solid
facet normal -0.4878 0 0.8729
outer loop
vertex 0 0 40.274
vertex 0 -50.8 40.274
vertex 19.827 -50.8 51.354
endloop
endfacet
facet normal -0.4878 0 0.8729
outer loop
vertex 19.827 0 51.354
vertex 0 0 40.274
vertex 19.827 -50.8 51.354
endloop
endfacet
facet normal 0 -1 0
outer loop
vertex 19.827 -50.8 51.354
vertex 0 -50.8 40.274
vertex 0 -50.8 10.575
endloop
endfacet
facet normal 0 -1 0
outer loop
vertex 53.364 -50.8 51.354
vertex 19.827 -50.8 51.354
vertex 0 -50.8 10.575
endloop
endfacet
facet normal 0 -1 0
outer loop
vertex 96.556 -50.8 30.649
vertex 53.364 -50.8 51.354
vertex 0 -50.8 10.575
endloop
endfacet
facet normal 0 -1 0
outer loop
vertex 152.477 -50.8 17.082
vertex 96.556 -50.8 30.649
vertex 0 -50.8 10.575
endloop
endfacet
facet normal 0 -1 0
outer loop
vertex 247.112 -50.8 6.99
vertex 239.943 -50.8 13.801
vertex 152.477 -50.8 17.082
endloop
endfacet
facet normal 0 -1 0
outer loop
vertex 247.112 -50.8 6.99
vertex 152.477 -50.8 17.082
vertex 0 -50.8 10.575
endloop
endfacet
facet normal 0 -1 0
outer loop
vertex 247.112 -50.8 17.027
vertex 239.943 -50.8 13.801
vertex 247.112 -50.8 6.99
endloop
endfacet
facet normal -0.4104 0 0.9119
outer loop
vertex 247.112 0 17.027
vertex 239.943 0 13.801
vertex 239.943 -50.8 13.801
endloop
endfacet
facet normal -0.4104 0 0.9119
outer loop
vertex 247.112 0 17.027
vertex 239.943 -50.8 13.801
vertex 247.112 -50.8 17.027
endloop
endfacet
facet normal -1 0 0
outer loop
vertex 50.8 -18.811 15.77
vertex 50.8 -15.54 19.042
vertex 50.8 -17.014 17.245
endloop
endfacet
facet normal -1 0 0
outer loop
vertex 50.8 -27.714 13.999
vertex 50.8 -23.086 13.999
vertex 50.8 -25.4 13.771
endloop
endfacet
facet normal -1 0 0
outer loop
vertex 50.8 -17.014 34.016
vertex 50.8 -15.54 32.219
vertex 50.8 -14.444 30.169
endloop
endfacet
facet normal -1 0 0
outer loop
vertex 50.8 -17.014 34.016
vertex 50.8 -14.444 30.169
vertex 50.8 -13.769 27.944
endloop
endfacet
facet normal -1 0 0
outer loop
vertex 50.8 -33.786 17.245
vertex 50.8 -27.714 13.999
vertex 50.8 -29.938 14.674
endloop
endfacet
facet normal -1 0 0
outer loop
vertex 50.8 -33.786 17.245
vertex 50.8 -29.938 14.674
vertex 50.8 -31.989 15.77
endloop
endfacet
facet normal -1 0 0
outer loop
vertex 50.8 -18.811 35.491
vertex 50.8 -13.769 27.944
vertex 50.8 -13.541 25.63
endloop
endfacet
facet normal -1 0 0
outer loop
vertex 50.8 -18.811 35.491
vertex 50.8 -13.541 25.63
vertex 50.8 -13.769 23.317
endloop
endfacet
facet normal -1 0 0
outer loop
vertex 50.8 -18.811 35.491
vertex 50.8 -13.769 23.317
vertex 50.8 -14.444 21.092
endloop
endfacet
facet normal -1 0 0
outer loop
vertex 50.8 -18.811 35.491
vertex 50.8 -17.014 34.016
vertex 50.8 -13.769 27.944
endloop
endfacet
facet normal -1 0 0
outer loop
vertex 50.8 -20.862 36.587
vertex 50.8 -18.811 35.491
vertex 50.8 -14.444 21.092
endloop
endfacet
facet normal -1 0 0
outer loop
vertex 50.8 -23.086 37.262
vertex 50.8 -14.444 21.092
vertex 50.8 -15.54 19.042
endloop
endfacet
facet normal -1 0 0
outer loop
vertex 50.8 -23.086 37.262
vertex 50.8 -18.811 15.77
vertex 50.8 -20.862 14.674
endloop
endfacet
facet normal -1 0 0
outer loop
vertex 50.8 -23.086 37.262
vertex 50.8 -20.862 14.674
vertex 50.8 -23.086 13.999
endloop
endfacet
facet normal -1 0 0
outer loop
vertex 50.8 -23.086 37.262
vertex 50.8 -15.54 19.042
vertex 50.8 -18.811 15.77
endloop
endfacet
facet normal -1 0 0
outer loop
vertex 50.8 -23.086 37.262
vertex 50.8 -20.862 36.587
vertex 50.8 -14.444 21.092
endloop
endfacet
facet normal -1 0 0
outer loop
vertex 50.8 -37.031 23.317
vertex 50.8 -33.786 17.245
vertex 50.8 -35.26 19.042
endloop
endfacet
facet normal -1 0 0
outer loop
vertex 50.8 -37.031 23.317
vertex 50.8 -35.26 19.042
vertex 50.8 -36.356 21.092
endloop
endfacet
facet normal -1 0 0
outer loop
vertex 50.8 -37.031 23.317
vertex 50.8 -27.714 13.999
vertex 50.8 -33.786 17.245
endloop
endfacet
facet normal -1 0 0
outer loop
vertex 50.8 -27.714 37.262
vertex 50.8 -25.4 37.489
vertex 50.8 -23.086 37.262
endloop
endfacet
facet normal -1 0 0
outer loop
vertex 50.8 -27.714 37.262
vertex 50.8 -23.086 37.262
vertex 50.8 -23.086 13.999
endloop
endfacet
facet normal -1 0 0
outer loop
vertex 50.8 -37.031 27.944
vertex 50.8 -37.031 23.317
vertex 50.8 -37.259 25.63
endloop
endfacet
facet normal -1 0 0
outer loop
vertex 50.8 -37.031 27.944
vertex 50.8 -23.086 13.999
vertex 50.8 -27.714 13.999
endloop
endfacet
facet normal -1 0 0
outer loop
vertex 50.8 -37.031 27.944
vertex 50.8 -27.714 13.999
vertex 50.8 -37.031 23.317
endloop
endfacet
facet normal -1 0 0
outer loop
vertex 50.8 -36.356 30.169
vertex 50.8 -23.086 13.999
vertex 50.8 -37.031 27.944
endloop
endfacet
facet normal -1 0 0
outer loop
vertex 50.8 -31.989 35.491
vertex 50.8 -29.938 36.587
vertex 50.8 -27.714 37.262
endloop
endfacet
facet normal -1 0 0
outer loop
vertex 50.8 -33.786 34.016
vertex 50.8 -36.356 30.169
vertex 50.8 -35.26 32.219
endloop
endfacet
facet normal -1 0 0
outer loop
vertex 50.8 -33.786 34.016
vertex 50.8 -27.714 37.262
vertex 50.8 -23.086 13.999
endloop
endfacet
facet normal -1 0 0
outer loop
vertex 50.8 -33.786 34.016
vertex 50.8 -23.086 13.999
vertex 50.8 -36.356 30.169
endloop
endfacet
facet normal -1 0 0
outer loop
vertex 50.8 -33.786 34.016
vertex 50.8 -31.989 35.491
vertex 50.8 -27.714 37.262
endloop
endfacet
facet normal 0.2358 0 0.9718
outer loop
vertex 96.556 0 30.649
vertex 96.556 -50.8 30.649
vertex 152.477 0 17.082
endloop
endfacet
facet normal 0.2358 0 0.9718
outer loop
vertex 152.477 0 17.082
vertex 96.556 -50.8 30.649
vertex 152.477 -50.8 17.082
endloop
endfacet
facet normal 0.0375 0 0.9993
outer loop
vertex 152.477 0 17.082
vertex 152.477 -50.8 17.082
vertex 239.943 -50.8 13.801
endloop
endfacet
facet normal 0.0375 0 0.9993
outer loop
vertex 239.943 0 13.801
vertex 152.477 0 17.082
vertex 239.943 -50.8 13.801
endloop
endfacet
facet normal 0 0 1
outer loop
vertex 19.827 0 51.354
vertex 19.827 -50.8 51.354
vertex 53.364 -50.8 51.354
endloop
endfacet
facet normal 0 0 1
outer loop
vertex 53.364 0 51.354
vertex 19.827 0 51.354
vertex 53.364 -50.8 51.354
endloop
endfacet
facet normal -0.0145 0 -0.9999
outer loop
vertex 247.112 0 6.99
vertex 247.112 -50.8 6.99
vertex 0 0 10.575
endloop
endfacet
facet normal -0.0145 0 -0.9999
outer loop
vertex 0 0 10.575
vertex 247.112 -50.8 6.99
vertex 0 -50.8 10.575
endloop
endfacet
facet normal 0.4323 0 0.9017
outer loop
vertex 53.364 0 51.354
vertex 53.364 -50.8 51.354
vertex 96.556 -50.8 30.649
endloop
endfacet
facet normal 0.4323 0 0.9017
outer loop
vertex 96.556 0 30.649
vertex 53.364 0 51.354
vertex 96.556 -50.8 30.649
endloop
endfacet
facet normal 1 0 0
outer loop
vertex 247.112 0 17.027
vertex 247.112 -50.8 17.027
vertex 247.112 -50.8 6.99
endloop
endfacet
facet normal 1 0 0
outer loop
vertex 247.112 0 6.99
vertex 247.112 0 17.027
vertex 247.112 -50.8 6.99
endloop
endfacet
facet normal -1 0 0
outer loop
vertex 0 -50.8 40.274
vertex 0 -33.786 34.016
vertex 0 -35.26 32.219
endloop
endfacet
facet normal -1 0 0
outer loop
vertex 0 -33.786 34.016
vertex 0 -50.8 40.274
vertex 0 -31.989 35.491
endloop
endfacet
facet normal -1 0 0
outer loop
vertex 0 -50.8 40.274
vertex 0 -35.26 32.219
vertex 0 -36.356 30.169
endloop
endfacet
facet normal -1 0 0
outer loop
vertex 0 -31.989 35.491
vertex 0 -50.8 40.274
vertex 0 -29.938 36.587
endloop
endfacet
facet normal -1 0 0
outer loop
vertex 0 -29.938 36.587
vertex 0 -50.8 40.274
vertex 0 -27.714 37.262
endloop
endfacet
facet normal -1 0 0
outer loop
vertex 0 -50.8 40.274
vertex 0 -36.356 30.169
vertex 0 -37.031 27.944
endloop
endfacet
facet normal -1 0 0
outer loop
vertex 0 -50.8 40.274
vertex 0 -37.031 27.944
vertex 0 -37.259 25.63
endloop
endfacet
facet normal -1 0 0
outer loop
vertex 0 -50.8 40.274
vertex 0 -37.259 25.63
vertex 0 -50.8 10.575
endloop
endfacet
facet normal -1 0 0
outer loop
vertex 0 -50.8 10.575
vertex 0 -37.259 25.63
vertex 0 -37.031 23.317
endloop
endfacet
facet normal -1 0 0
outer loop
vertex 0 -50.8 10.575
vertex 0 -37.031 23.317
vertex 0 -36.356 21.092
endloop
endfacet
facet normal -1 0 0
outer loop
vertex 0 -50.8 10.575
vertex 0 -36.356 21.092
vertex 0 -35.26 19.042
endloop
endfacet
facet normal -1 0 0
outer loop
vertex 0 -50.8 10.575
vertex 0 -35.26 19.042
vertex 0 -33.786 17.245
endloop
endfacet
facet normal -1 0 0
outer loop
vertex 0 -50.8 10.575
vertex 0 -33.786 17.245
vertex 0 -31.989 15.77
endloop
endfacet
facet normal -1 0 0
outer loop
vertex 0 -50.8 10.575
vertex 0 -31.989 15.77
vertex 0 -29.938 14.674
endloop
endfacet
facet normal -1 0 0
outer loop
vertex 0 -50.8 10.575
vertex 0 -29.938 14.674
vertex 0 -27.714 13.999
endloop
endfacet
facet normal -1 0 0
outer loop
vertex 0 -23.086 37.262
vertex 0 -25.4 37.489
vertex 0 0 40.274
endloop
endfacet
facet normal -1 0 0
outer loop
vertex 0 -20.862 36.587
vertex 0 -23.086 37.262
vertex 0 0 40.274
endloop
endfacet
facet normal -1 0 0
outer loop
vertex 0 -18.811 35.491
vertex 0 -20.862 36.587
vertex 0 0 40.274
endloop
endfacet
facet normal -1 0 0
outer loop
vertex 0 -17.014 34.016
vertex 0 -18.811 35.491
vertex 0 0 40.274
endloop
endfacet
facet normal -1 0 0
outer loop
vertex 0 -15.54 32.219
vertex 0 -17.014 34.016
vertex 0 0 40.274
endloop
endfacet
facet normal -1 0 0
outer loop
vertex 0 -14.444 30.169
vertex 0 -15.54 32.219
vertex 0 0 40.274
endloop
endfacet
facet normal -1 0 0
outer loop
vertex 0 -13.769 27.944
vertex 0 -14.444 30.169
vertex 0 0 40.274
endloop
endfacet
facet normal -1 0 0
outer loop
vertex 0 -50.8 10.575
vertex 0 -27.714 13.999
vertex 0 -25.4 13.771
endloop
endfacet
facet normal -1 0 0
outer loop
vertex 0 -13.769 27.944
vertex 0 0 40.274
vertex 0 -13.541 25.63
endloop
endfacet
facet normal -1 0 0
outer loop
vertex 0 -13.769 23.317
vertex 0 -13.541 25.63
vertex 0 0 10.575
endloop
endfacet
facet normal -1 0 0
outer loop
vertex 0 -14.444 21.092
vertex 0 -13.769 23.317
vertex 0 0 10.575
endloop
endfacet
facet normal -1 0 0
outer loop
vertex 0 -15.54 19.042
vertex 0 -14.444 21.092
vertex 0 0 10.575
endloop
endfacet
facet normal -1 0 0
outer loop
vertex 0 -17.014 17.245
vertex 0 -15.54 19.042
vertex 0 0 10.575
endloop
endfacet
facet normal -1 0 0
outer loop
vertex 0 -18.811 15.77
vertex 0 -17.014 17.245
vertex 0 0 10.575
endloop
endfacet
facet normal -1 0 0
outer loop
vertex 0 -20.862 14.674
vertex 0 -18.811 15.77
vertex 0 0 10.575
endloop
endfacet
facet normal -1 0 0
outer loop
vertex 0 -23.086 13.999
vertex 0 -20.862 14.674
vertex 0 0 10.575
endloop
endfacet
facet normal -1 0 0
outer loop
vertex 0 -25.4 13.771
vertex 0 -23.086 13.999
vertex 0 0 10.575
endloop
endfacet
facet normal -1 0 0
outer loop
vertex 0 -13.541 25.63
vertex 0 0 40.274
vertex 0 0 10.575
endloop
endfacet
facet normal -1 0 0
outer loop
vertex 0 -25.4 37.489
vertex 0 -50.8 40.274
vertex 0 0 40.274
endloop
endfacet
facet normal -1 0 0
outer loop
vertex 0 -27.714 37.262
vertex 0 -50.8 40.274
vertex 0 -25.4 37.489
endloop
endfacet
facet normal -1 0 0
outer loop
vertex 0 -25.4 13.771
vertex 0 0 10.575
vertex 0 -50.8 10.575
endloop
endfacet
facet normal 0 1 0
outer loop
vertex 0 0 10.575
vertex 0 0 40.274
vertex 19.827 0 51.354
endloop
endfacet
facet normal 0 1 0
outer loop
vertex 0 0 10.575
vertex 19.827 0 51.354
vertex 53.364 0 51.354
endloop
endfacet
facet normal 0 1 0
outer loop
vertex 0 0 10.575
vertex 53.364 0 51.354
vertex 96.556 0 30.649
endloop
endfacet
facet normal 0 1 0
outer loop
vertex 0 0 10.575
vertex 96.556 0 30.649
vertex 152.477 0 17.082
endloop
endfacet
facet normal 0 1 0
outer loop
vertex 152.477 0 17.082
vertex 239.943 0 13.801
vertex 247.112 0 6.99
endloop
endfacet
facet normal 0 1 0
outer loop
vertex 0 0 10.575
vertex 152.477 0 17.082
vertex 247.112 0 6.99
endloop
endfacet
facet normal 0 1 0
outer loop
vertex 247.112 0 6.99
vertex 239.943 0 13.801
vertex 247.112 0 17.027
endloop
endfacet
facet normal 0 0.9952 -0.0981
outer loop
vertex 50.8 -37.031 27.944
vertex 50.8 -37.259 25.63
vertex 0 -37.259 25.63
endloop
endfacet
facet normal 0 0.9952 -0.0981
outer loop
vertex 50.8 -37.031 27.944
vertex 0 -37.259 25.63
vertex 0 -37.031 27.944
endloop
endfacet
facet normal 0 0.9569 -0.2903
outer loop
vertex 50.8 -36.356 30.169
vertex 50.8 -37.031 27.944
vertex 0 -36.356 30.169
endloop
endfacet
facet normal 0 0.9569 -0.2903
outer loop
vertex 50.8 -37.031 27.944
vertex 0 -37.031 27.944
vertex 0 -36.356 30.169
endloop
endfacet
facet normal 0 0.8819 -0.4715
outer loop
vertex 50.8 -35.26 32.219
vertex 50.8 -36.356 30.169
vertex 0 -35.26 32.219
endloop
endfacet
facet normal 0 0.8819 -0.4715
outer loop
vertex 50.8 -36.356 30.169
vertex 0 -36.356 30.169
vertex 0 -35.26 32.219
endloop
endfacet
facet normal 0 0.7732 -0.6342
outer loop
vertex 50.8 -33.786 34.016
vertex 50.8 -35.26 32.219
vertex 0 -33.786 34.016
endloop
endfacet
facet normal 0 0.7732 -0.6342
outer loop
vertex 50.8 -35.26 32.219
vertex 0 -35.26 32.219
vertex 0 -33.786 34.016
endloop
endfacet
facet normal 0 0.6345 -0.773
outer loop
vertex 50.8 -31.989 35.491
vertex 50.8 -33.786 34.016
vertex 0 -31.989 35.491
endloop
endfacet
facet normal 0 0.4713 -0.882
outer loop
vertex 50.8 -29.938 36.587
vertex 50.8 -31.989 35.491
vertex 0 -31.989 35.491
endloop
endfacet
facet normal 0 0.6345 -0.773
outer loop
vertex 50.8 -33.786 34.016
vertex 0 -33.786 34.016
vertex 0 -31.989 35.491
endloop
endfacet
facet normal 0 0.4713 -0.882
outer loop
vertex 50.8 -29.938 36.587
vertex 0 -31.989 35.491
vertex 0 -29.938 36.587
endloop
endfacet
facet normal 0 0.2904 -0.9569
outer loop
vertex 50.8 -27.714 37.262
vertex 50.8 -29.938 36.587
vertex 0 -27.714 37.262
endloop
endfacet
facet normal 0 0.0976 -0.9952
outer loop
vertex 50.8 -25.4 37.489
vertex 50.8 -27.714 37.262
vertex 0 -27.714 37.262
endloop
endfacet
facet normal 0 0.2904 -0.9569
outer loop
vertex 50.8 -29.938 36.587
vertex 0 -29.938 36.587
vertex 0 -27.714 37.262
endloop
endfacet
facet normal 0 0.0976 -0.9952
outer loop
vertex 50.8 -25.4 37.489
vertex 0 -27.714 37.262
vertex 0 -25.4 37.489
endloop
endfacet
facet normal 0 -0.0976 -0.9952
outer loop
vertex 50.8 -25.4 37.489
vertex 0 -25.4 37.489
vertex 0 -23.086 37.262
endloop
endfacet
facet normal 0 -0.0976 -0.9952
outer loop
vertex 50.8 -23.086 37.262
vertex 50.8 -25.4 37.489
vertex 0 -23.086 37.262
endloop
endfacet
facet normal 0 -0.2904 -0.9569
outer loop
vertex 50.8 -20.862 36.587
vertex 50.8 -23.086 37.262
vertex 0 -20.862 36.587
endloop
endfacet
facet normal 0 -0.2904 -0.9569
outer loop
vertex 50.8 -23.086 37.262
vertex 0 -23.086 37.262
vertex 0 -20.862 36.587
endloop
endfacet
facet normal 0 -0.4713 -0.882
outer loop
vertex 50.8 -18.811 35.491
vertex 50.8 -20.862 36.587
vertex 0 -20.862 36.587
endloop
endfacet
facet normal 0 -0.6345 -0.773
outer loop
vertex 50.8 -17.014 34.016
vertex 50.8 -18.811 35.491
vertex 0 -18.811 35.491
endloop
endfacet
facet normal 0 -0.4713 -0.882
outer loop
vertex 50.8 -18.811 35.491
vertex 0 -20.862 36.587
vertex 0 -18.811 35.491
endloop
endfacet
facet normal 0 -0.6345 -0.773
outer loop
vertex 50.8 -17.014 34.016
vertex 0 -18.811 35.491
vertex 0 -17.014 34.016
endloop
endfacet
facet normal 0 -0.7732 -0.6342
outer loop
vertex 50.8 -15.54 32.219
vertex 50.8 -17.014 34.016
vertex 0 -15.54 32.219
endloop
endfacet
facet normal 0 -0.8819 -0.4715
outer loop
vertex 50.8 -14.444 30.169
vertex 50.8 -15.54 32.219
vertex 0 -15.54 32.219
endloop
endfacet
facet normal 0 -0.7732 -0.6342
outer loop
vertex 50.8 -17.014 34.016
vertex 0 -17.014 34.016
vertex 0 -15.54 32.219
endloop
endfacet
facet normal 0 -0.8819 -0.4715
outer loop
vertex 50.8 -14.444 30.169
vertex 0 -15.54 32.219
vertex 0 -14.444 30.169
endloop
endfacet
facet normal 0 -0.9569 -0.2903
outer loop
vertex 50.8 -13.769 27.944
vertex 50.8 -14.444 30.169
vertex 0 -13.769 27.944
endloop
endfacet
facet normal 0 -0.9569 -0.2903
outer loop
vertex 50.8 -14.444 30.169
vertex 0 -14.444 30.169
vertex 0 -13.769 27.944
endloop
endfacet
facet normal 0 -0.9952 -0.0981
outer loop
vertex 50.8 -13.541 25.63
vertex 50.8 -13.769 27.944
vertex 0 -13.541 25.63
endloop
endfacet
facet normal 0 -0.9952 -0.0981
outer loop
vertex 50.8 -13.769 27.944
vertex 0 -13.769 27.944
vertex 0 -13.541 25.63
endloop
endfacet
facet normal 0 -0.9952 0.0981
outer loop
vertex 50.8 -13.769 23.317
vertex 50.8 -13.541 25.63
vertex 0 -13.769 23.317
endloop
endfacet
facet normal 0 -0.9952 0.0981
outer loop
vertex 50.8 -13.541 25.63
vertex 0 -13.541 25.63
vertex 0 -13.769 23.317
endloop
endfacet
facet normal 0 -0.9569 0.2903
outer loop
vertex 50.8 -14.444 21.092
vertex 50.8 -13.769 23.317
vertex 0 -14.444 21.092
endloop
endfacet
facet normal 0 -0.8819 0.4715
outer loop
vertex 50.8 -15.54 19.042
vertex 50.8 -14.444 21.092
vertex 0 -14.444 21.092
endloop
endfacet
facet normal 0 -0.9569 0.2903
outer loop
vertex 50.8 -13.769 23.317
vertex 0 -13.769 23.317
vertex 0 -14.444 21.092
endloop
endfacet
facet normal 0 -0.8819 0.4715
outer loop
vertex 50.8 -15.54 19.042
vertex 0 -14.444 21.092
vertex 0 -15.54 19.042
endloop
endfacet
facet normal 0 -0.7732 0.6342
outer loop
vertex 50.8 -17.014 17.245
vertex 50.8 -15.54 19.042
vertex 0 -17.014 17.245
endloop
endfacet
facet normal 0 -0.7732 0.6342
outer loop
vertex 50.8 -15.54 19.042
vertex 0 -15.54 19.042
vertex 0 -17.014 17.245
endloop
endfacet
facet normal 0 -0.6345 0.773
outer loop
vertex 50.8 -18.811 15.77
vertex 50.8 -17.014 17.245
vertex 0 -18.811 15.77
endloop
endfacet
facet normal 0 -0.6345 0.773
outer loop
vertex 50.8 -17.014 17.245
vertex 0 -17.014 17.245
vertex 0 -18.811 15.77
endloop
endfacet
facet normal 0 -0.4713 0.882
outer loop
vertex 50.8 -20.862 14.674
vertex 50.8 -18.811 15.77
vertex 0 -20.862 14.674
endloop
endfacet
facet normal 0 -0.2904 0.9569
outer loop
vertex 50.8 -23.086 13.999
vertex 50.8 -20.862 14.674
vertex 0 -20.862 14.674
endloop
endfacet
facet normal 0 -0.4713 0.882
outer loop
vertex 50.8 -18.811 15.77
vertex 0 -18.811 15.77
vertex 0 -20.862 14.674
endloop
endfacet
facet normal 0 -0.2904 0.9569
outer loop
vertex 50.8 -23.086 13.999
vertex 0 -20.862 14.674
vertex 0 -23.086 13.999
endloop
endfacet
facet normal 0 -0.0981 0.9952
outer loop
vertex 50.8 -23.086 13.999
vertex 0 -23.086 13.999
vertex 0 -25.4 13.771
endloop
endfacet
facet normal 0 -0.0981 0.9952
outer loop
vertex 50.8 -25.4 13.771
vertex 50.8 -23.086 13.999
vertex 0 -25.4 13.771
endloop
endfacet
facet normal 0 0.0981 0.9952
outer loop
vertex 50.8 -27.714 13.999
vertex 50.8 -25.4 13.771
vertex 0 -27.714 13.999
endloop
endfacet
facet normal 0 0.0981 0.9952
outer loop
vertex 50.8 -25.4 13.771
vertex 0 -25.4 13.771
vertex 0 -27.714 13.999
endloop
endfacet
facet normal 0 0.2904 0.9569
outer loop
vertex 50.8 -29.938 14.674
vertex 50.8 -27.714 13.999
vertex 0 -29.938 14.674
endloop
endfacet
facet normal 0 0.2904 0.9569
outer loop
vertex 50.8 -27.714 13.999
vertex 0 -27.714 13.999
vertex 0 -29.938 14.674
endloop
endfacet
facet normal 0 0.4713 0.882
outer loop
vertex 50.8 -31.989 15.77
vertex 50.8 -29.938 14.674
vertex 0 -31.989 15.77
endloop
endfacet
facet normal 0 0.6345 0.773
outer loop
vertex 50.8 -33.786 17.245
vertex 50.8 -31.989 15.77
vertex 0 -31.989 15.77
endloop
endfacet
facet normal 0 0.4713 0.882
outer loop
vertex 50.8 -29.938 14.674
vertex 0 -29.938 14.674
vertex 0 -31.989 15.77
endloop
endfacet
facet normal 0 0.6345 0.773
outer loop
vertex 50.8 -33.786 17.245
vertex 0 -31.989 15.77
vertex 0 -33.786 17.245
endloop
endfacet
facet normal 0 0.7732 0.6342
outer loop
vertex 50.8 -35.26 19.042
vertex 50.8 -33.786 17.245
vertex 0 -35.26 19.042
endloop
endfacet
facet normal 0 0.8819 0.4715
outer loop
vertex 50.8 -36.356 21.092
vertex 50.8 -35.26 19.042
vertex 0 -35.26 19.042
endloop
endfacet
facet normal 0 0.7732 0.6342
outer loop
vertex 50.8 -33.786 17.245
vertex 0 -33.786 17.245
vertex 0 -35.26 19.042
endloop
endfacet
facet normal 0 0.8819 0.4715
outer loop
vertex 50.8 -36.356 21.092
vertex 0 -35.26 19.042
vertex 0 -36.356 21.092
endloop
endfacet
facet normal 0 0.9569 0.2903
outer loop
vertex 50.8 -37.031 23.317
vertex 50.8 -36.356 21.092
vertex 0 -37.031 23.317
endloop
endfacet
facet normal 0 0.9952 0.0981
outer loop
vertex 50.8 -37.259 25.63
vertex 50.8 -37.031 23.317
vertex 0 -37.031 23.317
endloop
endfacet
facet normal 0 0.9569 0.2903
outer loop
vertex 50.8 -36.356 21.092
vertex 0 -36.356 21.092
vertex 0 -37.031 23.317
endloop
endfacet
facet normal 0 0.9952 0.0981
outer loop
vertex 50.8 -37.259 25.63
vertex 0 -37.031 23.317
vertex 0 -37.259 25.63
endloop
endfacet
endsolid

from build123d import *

# Parameters (mm, degrees)
F1_DEPTH = 50.8
F2_R     = 11.859009
F4_DEPTH = 50.8
F5_DEPTH = 76.2


with BuildPart() as f1:
    # F0 (on Front) → F1 (new body)
    with BuildSketch(Plane.XZ):
        Polygon((0, 63.13429), (0, 0), (304.8, 0), (304.8, 17.081553), align=None)
    extrude(amount=F1_DEPTH)

    # F2 (on face) → F4 (cut)
    with BuildSketch(Plane(origin=(0, 0, 0), x_dir=(0, -1, 0), z_dir=(-1, 0, 0))):
        with Locations((25.4, 25.630444)):
            Circle(F2_R)
    extrude(amount=-F4_DEPTH, mode=Mode.SUBTRACT)

    # F3 (on face) → F5 (cut)
    with BuildSketch(Plane.XZ.offset(50.8)):
        Polygon((0, 63.13429), (0, 40.274497), (19.827113, 51.353723), (53.36424, 51.353723), (96.555851, 30.648993), (152.476817, 17.081553), (239.942938, 13.801008), (247.112304, 17.027218), (247.112304, 6.990121), (0, 10.574799), (0, 0), (304.8, 0), (304.8, 17.081553), align=None)
    extrude(amount=-F5_DEPTH, mode=Mode.SUBTRACT)


solid = f1.part
